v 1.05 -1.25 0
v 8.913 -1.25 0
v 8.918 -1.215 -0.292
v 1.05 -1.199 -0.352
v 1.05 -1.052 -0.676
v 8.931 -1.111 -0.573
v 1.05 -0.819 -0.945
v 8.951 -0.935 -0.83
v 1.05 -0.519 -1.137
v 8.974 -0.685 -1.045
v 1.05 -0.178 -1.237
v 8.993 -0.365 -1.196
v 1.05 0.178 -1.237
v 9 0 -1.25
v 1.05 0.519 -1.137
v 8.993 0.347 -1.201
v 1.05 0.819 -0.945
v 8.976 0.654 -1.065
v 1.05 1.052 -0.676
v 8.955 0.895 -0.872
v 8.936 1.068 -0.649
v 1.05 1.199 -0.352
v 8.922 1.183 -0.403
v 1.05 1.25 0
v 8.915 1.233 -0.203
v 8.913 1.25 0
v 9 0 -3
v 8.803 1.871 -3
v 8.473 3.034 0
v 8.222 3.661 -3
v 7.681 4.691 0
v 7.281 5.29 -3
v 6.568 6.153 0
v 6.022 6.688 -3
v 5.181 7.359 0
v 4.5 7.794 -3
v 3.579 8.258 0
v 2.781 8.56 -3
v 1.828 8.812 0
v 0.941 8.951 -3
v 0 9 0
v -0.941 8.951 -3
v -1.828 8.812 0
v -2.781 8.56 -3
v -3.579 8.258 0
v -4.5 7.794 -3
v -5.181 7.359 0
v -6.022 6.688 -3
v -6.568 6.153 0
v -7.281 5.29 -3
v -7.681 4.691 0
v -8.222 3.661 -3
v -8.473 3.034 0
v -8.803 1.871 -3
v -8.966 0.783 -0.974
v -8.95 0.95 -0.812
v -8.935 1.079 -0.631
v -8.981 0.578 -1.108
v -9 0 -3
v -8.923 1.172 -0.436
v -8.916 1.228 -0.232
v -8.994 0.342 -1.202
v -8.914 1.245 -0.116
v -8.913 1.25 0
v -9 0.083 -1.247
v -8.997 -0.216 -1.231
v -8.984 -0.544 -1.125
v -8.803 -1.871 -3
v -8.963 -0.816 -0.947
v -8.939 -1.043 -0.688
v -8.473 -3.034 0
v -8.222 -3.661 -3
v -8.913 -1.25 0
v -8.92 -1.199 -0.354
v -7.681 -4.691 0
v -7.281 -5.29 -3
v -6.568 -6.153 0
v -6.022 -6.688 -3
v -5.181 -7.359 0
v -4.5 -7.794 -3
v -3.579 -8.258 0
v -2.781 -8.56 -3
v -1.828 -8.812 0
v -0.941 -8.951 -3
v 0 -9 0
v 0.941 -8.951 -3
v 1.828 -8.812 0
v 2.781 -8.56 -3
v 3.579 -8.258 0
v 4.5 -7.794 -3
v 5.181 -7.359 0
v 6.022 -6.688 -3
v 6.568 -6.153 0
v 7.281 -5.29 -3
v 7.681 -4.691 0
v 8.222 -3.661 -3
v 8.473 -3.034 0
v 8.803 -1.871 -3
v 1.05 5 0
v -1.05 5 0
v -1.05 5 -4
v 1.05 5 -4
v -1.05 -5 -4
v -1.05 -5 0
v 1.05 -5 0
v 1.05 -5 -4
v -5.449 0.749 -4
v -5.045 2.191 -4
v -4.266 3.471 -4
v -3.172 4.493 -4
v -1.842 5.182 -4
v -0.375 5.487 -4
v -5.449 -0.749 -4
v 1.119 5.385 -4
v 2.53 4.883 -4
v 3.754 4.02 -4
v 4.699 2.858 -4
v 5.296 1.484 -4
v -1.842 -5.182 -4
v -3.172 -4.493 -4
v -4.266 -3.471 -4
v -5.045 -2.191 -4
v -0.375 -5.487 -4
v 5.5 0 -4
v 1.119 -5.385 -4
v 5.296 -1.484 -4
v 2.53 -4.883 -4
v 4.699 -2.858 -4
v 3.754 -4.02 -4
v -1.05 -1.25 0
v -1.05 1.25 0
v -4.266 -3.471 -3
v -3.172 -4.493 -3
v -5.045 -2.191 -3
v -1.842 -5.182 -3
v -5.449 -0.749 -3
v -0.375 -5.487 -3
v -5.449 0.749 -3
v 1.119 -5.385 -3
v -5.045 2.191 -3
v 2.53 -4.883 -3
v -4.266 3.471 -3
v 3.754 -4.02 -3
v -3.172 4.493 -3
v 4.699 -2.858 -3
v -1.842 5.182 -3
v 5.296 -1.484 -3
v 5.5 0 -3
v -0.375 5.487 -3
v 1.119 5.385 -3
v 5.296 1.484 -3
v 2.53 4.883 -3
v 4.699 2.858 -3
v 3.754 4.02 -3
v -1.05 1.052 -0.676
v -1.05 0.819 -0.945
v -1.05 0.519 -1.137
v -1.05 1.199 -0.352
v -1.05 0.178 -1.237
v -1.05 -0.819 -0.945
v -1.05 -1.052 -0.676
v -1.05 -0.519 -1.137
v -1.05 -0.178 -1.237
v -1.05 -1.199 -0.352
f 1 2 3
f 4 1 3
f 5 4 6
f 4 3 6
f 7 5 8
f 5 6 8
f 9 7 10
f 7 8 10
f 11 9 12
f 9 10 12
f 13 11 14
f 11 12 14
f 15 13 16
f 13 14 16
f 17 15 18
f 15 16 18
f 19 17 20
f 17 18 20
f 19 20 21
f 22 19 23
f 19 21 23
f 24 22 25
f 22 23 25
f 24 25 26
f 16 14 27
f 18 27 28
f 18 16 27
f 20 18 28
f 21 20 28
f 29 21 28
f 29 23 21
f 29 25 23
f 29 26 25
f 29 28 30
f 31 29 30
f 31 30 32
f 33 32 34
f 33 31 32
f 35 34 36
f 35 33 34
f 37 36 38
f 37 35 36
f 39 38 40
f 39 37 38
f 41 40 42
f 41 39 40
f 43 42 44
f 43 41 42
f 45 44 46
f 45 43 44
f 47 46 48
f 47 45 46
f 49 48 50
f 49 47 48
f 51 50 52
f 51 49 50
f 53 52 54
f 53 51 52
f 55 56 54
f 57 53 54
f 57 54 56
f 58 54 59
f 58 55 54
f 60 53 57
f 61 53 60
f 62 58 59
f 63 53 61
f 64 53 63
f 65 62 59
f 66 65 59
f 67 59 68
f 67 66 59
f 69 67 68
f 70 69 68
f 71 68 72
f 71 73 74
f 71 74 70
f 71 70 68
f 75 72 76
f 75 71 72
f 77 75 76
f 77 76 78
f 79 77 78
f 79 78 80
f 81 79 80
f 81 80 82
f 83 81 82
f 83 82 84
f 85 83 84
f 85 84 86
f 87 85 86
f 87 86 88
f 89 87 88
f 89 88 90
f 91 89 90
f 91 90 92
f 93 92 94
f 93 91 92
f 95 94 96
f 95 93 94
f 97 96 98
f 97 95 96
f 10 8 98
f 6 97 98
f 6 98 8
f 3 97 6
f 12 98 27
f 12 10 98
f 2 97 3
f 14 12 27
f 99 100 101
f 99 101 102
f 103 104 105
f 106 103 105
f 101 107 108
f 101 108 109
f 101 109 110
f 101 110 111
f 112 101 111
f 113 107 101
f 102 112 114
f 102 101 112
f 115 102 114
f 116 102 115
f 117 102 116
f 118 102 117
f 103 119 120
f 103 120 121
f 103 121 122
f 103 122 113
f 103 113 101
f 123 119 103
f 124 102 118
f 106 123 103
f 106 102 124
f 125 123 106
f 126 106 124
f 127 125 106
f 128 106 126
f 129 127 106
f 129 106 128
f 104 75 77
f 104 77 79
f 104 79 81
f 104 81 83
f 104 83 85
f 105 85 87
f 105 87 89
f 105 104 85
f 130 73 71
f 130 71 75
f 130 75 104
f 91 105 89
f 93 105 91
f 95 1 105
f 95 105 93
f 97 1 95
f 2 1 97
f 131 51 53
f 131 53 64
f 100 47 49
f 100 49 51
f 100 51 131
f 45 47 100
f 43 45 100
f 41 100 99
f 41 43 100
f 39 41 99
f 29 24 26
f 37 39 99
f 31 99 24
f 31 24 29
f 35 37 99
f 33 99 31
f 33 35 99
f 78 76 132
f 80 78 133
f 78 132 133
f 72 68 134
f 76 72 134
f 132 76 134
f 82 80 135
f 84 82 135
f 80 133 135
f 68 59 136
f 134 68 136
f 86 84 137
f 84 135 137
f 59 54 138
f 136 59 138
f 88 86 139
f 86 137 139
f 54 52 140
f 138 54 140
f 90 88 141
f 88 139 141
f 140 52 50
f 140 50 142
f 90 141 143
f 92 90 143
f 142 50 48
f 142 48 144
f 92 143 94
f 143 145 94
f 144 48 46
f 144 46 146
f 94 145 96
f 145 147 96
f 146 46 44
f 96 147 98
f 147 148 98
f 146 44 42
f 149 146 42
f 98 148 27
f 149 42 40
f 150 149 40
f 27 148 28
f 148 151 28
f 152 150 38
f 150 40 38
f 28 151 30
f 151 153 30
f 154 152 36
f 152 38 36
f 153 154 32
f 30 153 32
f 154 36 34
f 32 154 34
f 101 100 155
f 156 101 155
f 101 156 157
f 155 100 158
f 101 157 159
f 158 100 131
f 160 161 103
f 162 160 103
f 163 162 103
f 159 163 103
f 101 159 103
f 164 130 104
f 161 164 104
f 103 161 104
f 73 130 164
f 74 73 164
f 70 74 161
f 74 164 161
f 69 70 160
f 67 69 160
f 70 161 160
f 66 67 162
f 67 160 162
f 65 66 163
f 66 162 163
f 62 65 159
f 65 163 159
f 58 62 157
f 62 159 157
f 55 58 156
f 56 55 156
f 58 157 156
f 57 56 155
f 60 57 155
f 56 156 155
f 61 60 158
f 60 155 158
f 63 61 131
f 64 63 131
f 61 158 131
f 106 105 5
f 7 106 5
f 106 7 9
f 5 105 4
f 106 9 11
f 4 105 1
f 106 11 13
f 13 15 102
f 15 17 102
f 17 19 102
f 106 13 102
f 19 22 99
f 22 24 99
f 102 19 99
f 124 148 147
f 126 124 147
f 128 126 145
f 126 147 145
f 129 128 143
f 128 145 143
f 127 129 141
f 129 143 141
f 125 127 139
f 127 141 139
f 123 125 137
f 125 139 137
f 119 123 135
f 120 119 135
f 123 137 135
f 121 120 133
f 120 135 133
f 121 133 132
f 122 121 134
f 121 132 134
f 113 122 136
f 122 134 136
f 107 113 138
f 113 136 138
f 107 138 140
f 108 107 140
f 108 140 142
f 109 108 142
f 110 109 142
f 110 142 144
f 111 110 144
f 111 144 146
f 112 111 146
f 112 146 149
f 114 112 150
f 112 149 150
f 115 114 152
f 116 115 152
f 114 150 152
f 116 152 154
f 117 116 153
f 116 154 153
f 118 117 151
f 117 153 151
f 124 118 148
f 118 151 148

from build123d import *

# Parameters (mm, degrees)
F0_R     = 9
F1_DEPTH = 3
F2_R     = 5.5
F3_DEPTH = 1
F4_R     = 1.25
F5_DEPTH = 9
F6_W     = 2.1
F6_H     = 3.75
F6_H_2   = 2.5
F7_DEPTH = 4.001


# Not quite as in the source:
# - a feature names something its author has since deleted; it is built from what else it names


with BuildPart() as f1:
    # F0 (on Top) → F1 (new body)
    with BuildSketch(Plane.XY):
        Circle(F0_R)
    extrude(amount=-F1_DEPTH)

    # F2 (on face) → F3 (join)
    with BuildSketch(Plane(origin=(0, 0, -3), x_dir=(1, 0, 0), z_dir=(0, 0, -1))):
        Circle(F2_R)
    extrude(amount=F3_DEPTH)

    # F4 (on Right) → F5 (cut, symmetric)
    with BuildSketch(Plane.YZ):
        Circle(F4_R)
    extrude(amount=F5_DEPTH, both=True, mode=Mode.SUBTRACT)

    # F6 (on face) → F7 (cut, through all)
    with BuildSketch(Plane.XY):
        with Locations((0, -3.125)):
            Rectangle(F6_W, F6_H)
        Rectangle(F6_W, F6_H_2)
        with Locations((0, 3.125)):
            Rectangle(F6_W, F6_H)
    extrude(amount=-F7_DEPTH, mode=Mode.SUBTRACT)


solid = f1.part
